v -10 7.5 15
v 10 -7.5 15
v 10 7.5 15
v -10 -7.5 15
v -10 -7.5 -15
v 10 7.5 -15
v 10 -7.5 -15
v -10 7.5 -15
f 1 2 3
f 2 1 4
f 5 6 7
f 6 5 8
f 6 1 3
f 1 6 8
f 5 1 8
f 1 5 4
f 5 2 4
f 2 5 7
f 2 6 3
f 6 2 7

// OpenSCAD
// Generated by generate_scads.py
rotate([180,180,0]) {
  cube(size=[20,15,30], center=true);
}
